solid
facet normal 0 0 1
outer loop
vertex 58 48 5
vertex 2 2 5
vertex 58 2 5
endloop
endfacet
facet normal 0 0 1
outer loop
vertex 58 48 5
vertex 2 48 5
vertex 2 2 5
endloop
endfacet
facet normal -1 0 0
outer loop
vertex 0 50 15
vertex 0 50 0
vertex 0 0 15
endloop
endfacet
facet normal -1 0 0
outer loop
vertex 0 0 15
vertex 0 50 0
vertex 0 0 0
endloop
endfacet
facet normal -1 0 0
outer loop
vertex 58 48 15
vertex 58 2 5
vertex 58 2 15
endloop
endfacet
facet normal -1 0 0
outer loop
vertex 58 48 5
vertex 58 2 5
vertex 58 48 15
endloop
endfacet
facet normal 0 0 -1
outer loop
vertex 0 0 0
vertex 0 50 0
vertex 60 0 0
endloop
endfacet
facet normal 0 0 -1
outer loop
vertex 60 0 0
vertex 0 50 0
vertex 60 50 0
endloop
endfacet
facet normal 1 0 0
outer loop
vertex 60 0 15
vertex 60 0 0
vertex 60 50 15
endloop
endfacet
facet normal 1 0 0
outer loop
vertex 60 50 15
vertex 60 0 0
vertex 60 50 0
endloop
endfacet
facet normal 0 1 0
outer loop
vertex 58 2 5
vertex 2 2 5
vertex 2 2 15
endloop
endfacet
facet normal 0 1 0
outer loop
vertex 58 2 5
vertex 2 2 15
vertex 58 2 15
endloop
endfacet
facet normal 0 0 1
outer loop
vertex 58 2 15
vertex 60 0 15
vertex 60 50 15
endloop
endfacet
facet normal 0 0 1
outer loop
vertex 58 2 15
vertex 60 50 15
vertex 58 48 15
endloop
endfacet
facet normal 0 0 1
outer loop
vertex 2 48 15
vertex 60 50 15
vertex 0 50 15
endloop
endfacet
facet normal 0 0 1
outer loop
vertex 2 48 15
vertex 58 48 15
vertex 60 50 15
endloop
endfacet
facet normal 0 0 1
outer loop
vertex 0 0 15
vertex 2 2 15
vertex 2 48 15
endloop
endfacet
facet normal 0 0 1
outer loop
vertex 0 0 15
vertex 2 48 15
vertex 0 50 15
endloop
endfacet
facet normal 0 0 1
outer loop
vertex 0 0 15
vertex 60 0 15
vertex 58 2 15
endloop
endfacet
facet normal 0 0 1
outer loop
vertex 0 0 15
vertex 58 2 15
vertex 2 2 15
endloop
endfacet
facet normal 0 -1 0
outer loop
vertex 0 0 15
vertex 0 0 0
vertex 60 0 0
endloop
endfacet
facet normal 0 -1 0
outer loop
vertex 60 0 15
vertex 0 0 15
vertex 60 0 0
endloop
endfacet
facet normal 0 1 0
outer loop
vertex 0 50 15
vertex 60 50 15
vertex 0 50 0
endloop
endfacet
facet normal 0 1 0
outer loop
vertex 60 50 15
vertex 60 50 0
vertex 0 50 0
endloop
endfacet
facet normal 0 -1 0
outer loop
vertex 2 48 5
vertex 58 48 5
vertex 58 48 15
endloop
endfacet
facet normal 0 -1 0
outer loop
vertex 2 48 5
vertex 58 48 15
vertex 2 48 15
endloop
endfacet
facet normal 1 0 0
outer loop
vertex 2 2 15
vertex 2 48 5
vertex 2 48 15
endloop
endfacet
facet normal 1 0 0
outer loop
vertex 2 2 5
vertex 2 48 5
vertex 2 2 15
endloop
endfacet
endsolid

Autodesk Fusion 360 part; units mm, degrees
sketch "Skizze1" plane through (0, 0, 0) normal (0, 0, 1) x (1, 0, 0)
  line L0 (0, 0) -> (60, 0)
  line L1 (60, 0) -> (60, 50)
  line L2 (60, 50) -> (0, 50)
  line L3 (0, 50) -> (0, 0)
  dimension "d1" = 60
  dimension "d2" = 50
extrude "Extrusion1" add sketch "Skizze1" along normal blind 5
sketch "Skizze2" plane through (0, 0, 5) normal (0, 0, 1) x (-1, 0, 0)
  line L0 (0, -50) -> (0, 0)
  line L1 (0, 0) -> (-60, 0)
  line L2 (-60, 0) -> (-60, -50)
  line L3 (-60, -50) -> (0, -50)
  line L4 (-58, -2) -> (-58, -48)
  line L5 (-58, -48) -> (-2, -48)
  line L6 (-2, -48) -> (-2, -2)
  line L7 (-2, -2) -> (-58, -2)
  dimension "d5" = -2
extrude "Extrusion2" add sketch "Skizze2" along normal blind 10
scale "Maßstab1" factor 1 about (60, 0, 0) bodies 1
